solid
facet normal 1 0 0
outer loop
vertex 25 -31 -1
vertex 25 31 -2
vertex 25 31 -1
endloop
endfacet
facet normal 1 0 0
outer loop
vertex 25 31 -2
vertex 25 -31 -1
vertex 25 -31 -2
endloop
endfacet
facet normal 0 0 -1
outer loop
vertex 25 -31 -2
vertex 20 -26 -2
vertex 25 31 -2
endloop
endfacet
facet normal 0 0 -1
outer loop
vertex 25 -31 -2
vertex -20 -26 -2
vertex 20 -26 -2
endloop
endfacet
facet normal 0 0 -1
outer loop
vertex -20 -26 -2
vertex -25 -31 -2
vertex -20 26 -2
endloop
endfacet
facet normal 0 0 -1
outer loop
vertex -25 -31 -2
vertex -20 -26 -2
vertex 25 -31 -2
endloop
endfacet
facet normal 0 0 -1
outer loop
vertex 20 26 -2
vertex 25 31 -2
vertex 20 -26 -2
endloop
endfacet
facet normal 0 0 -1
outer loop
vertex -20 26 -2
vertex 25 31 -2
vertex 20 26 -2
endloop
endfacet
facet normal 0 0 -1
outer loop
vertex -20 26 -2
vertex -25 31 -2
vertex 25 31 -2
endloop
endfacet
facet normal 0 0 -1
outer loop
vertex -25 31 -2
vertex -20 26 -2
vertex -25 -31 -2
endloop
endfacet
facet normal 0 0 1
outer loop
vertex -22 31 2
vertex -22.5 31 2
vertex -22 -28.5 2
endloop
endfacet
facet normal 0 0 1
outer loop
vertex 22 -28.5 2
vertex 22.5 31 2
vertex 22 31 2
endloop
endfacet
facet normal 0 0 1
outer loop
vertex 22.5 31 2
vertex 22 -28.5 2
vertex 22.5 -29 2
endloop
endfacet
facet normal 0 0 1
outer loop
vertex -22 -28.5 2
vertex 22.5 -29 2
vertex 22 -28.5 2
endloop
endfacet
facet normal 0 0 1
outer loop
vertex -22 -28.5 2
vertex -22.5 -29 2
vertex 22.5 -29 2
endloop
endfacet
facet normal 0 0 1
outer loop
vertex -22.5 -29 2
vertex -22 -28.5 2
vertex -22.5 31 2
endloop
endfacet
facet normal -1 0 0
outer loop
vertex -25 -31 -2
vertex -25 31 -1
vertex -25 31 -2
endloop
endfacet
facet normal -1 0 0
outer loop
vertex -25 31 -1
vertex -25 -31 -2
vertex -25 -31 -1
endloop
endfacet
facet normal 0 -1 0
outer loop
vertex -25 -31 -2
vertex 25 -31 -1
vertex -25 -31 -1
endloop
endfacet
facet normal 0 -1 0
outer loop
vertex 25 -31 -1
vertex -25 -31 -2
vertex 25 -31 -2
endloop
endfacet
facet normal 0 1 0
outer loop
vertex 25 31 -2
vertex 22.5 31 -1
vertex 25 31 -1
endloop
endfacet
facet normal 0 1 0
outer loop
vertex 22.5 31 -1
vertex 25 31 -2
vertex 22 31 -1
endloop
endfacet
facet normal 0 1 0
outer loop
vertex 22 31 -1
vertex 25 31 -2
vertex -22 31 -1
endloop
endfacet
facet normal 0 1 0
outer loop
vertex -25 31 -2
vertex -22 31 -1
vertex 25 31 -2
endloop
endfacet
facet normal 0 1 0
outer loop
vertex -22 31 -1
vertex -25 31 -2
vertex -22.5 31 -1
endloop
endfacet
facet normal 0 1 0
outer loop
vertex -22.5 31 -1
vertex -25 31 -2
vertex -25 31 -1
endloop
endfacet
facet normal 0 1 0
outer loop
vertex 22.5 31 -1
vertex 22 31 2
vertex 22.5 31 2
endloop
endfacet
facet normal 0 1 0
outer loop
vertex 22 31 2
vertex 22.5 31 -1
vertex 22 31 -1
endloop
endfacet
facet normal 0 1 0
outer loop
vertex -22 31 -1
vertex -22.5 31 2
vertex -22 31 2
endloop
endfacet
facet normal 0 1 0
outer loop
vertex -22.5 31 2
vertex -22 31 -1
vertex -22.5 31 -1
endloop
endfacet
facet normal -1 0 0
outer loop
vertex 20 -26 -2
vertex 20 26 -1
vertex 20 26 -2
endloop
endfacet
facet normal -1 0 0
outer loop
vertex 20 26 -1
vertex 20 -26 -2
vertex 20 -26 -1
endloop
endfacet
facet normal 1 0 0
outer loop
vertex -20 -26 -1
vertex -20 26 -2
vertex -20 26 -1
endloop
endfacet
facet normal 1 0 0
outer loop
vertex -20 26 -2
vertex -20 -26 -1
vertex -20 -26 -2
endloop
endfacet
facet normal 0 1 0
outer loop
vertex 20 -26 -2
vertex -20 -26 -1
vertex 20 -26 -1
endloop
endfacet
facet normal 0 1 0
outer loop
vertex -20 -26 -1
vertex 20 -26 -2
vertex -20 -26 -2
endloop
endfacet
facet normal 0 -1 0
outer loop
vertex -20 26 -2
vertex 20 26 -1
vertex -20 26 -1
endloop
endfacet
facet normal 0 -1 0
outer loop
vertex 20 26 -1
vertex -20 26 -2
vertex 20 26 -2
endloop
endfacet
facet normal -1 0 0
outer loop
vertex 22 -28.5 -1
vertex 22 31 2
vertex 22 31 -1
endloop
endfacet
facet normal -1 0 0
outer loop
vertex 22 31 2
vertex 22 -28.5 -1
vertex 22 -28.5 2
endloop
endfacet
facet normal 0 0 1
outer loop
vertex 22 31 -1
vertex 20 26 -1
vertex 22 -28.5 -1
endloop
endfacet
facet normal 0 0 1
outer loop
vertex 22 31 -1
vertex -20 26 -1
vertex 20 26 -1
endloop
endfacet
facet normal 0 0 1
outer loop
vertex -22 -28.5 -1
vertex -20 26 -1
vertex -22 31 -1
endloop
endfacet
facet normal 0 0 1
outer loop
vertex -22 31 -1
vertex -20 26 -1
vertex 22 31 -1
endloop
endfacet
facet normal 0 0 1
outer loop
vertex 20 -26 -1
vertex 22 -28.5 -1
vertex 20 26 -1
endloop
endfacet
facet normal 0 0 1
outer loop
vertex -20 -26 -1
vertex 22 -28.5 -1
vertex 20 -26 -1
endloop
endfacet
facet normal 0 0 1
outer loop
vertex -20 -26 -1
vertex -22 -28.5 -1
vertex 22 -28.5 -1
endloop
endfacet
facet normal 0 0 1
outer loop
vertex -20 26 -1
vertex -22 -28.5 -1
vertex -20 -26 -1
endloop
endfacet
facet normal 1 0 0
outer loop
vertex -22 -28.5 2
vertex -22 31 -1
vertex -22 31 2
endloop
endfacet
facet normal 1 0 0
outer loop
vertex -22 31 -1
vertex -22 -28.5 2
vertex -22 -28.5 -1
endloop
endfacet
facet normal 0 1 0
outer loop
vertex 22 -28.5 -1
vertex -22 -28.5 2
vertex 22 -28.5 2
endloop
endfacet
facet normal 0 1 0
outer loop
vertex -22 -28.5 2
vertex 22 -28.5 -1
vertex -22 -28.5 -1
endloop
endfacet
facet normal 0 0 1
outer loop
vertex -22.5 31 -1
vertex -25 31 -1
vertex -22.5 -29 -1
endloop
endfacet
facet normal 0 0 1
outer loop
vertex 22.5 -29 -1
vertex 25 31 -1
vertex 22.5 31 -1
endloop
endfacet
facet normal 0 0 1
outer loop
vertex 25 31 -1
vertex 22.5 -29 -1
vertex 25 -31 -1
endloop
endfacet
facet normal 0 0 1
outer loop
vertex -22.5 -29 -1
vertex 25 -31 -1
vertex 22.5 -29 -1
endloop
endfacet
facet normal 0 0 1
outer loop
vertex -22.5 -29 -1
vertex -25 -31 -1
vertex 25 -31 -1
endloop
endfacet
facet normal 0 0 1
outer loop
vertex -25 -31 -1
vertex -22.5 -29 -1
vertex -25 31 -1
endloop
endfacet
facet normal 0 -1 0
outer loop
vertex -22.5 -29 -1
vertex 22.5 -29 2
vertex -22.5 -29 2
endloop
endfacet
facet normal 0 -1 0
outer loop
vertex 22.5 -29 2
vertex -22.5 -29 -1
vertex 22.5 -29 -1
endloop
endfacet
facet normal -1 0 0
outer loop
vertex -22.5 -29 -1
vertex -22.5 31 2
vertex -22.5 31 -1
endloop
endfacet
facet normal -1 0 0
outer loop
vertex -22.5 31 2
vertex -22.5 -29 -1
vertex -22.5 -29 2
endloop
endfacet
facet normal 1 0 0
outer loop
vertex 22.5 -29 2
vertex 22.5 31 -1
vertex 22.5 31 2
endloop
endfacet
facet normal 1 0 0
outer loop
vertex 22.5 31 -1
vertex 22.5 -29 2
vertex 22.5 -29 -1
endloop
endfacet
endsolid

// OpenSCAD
module dummy() {
    translate([0,-3,0]) union() { //LCD Dummy
        color("silver") cube([43,62,6], true);
        translate([0,3,0.1]) color("black") cube([40,52,6], true);

        translate([0,30,0]) cube([10,2,10], true);
        translate([20.75,0,0]) cube([1.5,10,10], true);
        translate([0,-25.5,0]) cube([10,5,10], true);
    }
}

wall = 2;

module frame() {
    difference() {
        color("red") cube([50,62,4], center=true); //Outer frame
        cube([40,52,10], center=true); //LCD
        translate([0,-2.5,-1]) cube([44,62,4], center=true); //Display
        
        translate([0,31.5,0-1]) cube([100,5,4], center=true);
        translate([-25,0,0-1]) cube([5,100,4], center=true);
        translate([25,0,0-1]) cube([5,100,4], center=true);
    }
}

rotate([180,0,0]) frame();

//dummy();
